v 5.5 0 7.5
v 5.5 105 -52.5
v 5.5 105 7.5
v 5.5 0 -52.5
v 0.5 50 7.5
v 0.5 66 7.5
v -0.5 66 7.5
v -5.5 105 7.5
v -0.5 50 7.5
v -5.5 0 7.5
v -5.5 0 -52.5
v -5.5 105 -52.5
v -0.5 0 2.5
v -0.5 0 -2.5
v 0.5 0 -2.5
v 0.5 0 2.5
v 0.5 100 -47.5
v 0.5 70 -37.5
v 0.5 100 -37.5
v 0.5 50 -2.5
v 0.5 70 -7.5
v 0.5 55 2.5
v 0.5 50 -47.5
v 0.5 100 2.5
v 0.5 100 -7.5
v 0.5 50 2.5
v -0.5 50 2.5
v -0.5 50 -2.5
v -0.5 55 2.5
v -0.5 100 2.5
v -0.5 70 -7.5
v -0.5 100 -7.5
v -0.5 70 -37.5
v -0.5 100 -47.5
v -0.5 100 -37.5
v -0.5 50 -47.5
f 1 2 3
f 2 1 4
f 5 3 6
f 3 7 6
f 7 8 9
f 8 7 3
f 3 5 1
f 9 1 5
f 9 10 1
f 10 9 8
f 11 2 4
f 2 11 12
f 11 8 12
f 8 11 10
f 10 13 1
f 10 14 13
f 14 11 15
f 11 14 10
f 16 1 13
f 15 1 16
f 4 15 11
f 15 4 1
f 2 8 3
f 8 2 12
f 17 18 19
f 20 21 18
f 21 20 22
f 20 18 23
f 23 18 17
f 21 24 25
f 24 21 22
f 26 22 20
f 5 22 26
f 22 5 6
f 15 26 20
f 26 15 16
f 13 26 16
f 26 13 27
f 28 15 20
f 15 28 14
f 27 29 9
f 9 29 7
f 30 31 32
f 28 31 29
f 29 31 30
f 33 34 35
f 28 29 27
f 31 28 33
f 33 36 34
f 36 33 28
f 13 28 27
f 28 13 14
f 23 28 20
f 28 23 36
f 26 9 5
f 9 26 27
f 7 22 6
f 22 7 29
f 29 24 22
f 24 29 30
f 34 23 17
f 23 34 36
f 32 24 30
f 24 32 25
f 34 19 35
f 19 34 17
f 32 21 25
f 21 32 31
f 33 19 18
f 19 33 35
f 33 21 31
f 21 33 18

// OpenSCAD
// Baseline CAD geometry, with all dimensions in millimetres; +Y follows the throat and +Z is up.
// Positive modules describe air/cutting volumes; skin modules describe outer material.
// solidBody subtracts the former from the latter. The thin spawn cube spans Y=-1 to 0,
// so the generator can retain its Y=0 face and construct the inlet boundary rectangle.
// The final two calls display BOTH objects. Export each module separately as ASCII STL
// using the wrapper procedure in README; exporting this complete scene combines them.

skinThickness = 5;

throatWidth = 1;
throatLength = 50;
throatHeight = 5;

voicingHoleWidth = 1;
voicingHoleLength = 5;
voicingHoleHeight = skinThickness;
voicingHoleX = -voicingHoleWidth / 2;
voicingHoleY = throatLength;
voicingHoleZ = throatHeight / 2;

voicingEdgeLength = 10;

pressureChamberWidth = 1;
pressureChamberLength = 50;
pressureChamberHeight = 50;
pressureChamberX = -pressureChamberWidth / 2;
pressureChamberY = throatLength;
pressureChamberZ = -pressureChamberHeight + throatHeight / 2;

chamberFillerLength = 30;
chamberFillerHeight = 30;


module throatPositive() {
    translate([-throatWidth / 2, -1, -throatHeight / 2])
    cube([throatWidth, throatLength + 2, throatHeight]);
}

module throatSkin() {
    translate([-(pressureChamberWidth + skinThickness * 2) / 2, 0, pressureChamberZ - skinThickness])
    cube([pressureChamberWidth + skinThickness * 2, throatLength - 1, pressureChamberHeight + skinThickness * 2]);
}

module voicingHolePositive() {
    translate([voicingHoleX, voicingHoleY, voicingHoleZ - 1])
    cube([voicingHoleWidth, voicingHoleLength, voicingHoleHeight + 2]);
}

module voicingEdgePositive() {
    translate([voicingHoleWidth / 2, voicingHoleY + voicingHoleLength - 0.00001, throatHeight / 2])
    rotate([0, -90, 0])
    linear_extrude(height = voicingHoleWidth)
    polygon([
        [0, 0],
        [skinThickness + 0.00001, 0],
        [skinThickness + 0.00001, voicingEdgeLength + 1]
    ]);
}

module pressureChamberPositive() {
    translate([pressureChamberX, pressureChamberY, pressureChamberZ])
    cube([pressureChamberWidth, pressureChamberLength, pressureChamberHeight]);
}

module pressureChamberSkin() {
    translate([pressureChamberX - skinThickness, pressureChamberY - skinThickness, pressureChamberZ - skinThickness])
    cube([pressureChamberWidth + skinThickness * 2, pressureChamberLength + skinThickness * 2, pressureChamberHeight + skinThickness * 2]);
}

module positiveGroup() {
    union() {
        throatPositive();
        voicingHolePositive();
        voicingEdgePositive();
        pressureChamberPositive();
    }
}

module skinGroup() {
    union() {
        throatSkin();
        pressureChamberSkin();
    }
}

module solidBody() {
    difference() {
        skinGroup();
        positiveGroup();
    }
    
    translate([pressureChamberX - skinThickness, pressureChamberY + pressureChamberLength - chamberFillerLength, pressureChamberZ + pressureChamberHeight / 2 - chamberFillerHeight / 2])
    cube([pressureChamberWidth + skinThickness * 2, chamberFillerLength, chamberFillerHeight]);
    
}

module spawnPlane() {
    translate([-throatWidth / 2, -1, -throatHeight / 2])
    cube([throatWidth, 1, throatHeight]);
}

difference() {
solidBody();
//translate([0, -500, -500]) cube([1000, 1000, 1000]);
}
*spawnPlane();
